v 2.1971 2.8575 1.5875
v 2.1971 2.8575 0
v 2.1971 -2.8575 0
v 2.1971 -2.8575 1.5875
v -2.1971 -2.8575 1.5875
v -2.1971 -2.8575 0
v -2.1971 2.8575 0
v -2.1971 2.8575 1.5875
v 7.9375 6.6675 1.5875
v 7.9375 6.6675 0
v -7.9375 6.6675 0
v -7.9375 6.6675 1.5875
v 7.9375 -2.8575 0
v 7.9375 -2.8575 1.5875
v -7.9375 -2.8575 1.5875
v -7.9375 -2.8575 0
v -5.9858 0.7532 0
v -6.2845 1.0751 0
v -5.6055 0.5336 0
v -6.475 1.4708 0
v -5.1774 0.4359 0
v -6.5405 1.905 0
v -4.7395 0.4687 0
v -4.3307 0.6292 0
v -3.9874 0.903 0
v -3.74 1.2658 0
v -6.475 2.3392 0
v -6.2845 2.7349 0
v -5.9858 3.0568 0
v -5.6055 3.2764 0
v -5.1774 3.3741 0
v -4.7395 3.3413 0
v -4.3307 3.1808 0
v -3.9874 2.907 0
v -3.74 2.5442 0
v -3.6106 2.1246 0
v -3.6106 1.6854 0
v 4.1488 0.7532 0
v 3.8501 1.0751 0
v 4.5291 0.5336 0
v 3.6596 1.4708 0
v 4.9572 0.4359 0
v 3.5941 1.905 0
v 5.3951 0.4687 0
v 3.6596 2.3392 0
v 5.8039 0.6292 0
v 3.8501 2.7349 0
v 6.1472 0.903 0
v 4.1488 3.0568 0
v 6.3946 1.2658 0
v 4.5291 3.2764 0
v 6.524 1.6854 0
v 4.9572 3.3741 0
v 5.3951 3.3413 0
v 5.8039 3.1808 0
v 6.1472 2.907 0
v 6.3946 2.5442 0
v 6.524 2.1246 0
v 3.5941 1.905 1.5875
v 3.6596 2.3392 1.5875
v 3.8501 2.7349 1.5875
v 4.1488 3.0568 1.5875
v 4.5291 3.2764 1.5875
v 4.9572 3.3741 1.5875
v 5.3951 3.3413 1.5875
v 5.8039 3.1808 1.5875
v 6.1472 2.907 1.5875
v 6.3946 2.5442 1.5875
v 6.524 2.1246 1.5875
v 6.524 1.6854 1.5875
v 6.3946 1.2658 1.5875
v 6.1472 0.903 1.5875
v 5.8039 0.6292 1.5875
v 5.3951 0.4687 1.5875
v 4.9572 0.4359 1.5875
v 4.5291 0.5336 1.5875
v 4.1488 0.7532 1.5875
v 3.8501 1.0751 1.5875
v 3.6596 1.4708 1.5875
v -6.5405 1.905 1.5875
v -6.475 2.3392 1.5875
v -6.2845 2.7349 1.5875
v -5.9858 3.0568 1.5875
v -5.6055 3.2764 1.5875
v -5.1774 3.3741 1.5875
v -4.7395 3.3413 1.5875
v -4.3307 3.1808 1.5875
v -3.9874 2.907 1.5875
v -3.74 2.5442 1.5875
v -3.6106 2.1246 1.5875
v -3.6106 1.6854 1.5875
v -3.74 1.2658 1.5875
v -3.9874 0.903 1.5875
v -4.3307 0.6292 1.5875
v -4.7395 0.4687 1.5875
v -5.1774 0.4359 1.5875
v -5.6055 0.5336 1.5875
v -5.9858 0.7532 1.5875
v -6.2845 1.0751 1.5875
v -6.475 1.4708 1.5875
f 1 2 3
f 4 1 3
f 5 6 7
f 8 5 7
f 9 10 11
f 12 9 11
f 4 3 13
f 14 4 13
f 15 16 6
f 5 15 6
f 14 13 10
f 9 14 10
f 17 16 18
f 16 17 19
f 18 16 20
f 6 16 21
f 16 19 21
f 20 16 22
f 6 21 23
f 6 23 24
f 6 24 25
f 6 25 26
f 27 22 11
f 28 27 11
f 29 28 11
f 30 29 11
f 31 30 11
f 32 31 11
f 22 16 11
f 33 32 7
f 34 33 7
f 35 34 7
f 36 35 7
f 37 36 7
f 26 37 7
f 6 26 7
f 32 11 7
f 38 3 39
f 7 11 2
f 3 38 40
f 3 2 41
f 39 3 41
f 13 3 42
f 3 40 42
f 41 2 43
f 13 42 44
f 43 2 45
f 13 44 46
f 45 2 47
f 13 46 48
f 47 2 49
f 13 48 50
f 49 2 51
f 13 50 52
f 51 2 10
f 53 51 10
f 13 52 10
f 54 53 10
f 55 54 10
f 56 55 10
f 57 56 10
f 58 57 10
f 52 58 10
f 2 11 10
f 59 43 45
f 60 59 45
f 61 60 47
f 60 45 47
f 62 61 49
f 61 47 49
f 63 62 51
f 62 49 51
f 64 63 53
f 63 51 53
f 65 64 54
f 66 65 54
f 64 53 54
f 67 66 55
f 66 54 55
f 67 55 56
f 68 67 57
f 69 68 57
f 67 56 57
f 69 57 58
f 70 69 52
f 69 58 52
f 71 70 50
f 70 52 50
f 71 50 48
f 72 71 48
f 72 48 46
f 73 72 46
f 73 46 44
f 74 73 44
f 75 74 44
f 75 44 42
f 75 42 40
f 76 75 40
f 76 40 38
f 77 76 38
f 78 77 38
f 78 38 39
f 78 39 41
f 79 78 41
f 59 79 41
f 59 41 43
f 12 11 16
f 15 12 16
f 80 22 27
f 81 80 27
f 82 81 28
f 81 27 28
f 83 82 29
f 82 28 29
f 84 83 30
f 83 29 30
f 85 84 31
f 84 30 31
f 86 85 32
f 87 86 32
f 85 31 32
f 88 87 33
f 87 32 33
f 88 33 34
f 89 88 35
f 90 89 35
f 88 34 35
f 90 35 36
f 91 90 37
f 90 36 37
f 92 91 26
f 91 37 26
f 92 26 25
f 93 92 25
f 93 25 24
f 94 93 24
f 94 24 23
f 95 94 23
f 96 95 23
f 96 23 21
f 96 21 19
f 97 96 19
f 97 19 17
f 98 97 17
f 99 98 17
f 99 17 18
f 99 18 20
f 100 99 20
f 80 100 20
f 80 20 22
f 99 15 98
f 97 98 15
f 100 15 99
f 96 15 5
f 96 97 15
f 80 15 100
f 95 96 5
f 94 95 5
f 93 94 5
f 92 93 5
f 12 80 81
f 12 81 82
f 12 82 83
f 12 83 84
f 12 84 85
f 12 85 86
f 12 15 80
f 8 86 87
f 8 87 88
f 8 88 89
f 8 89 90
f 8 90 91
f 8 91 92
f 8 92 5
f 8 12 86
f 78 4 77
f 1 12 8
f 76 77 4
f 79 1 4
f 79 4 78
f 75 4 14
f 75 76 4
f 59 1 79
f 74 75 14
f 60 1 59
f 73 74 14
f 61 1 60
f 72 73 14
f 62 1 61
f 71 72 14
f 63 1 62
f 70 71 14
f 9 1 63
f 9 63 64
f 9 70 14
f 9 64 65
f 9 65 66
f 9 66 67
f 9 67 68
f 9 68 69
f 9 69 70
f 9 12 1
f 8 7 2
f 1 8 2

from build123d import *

# Parameters (mm, degrees)
BOSS_EXTRUDE1_DEPTH   = 1.5875
F_4_CLEARANCE_HOLE1_D = 2.9464


with BuildPart() as part:
    # Sketch2 → Boss-Extrude1 (new body)
    with BuildSketch(Plane.XY):
        Polygon((-2.1971, 2.8575), (2.1971, 2.8575), (2.1971, -2.8575), (7.9375, -2.8575), (7.9375, 6.6675), (-7.9375, 6.6675), (-7.9375, -2.8575), (-2.1971, -2.8575), align=None)
    extrude(amount=BOSS_EXTRUDE1_DEPTH)

    # #4 Clearance Hole1 (through all)
    with Locations(Plane.XY.offset(1.5875)):
        with Locations((-5.0673, 1.905), (5.0673, 1.905)):
            Hole(F_4_CLEARANCE_HOLE1_D / 2)


solid = part.part
